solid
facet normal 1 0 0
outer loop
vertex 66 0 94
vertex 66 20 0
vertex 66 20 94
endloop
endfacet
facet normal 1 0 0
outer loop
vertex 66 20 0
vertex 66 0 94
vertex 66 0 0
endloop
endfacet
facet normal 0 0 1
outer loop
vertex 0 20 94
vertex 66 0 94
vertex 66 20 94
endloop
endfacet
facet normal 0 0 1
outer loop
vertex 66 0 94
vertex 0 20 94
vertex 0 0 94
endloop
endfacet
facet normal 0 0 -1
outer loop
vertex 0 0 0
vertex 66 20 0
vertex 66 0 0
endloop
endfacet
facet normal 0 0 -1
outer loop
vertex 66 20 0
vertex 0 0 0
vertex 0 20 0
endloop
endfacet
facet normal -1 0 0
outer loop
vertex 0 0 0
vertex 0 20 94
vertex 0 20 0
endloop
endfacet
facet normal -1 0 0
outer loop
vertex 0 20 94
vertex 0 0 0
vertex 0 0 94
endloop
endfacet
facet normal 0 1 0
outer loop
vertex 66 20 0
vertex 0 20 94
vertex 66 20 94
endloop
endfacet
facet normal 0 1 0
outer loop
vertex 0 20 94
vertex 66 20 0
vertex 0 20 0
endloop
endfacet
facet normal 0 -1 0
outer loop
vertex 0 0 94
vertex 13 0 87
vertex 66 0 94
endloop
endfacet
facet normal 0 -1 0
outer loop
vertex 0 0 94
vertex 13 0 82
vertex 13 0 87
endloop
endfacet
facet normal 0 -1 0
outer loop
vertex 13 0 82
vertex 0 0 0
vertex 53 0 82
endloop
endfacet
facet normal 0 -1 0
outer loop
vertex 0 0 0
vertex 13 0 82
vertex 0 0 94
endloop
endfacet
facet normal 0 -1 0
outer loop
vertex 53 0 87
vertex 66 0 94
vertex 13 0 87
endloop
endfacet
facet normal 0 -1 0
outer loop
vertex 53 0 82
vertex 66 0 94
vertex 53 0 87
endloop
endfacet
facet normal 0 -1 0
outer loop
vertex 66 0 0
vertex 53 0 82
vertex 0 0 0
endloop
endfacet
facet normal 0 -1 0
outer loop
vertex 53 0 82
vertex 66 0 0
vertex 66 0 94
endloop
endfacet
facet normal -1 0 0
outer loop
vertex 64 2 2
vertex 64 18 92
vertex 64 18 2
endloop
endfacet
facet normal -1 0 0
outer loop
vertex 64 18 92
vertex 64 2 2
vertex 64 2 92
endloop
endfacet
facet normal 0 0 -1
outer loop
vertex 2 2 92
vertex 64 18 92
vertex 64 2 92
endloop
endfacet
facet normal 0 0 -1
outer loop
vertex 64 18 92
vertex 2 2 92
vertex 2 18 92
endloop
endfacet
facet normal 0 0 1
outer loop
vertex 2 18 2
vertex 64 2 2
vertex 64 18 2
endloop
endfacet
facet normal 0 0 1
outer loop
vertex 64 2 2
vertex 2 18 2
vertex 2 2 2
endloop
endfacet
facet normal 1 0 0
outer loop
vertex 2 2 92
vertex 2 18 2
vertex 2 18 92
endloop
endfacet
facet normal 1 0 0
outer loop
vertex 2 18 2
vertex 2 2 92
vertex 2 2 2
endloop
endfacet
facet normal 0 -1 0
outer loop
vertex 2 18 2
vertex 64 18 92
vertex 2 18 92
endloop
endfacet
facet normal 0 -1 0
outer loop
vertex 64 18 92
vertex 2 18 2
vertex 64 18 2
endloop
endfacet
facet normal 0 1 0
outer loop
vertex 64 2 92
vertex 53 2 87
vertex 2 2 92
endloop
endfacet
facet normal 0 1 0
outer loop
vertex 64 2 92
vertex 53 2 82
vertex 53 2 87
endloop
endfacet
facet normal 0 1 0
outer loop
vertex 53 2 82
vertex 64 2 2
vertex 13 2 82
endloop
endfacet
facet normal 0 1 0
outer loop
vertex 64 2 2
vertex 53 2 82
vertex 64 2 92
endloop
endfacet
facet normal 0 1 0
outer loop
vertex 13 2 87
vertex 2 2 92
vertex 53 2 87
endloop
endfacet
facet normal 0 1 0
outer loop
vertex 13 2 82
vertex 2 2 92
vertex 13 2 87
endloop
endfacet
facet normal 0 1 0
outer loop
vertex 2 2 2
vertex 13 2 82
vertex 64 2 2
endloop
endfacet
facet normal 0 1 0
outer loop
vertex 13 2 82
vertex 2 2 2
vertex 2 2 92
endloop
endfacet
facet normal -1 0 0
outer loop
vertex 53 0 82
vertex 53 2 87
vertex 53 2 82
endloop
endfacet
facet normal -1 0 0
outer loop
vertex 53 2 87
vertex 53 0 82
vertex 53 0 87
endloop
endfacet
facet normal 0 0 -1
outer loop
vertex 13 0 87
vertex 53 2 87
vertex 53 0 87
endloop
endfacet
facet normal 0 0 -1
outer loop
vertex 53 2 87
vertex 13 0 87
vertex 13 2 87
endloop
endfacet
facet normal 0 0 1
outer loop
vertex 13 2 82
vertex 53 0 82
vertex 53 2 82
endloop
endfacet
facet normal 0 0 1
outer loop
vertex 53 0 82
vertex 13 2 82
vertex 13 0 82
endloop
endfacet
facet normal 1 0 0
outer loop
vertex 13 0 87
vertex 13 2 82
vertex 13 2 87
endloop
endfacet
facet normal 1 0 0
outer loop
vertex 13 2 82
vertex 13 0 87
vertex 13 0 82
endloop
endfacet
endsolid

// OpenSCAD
// Pustekortet - eske til 52 kort (ca. 0,3 mm per kort). Mål i mm.
kort_b = 62;
kort_h = 90;
kort_tykk = 16;
vegg = 2;
ytre_b = kort_b + 2 * vegg;
ytre_h = kort_h + 2 * vegg;
ytre_d = kort_tykk + 2 * vegg;

difference() {
    cube([ytre_b, ytre_d, ytre_h]);
    translate([vegg, vegg, vegg]) cube([kort_b, kort_tykk, kort_h]);
    translate([ytre_b / 2 - 20, -1, ytre_h - 12]) cube([40, vegg + 2, 5]);  // uttak
}
